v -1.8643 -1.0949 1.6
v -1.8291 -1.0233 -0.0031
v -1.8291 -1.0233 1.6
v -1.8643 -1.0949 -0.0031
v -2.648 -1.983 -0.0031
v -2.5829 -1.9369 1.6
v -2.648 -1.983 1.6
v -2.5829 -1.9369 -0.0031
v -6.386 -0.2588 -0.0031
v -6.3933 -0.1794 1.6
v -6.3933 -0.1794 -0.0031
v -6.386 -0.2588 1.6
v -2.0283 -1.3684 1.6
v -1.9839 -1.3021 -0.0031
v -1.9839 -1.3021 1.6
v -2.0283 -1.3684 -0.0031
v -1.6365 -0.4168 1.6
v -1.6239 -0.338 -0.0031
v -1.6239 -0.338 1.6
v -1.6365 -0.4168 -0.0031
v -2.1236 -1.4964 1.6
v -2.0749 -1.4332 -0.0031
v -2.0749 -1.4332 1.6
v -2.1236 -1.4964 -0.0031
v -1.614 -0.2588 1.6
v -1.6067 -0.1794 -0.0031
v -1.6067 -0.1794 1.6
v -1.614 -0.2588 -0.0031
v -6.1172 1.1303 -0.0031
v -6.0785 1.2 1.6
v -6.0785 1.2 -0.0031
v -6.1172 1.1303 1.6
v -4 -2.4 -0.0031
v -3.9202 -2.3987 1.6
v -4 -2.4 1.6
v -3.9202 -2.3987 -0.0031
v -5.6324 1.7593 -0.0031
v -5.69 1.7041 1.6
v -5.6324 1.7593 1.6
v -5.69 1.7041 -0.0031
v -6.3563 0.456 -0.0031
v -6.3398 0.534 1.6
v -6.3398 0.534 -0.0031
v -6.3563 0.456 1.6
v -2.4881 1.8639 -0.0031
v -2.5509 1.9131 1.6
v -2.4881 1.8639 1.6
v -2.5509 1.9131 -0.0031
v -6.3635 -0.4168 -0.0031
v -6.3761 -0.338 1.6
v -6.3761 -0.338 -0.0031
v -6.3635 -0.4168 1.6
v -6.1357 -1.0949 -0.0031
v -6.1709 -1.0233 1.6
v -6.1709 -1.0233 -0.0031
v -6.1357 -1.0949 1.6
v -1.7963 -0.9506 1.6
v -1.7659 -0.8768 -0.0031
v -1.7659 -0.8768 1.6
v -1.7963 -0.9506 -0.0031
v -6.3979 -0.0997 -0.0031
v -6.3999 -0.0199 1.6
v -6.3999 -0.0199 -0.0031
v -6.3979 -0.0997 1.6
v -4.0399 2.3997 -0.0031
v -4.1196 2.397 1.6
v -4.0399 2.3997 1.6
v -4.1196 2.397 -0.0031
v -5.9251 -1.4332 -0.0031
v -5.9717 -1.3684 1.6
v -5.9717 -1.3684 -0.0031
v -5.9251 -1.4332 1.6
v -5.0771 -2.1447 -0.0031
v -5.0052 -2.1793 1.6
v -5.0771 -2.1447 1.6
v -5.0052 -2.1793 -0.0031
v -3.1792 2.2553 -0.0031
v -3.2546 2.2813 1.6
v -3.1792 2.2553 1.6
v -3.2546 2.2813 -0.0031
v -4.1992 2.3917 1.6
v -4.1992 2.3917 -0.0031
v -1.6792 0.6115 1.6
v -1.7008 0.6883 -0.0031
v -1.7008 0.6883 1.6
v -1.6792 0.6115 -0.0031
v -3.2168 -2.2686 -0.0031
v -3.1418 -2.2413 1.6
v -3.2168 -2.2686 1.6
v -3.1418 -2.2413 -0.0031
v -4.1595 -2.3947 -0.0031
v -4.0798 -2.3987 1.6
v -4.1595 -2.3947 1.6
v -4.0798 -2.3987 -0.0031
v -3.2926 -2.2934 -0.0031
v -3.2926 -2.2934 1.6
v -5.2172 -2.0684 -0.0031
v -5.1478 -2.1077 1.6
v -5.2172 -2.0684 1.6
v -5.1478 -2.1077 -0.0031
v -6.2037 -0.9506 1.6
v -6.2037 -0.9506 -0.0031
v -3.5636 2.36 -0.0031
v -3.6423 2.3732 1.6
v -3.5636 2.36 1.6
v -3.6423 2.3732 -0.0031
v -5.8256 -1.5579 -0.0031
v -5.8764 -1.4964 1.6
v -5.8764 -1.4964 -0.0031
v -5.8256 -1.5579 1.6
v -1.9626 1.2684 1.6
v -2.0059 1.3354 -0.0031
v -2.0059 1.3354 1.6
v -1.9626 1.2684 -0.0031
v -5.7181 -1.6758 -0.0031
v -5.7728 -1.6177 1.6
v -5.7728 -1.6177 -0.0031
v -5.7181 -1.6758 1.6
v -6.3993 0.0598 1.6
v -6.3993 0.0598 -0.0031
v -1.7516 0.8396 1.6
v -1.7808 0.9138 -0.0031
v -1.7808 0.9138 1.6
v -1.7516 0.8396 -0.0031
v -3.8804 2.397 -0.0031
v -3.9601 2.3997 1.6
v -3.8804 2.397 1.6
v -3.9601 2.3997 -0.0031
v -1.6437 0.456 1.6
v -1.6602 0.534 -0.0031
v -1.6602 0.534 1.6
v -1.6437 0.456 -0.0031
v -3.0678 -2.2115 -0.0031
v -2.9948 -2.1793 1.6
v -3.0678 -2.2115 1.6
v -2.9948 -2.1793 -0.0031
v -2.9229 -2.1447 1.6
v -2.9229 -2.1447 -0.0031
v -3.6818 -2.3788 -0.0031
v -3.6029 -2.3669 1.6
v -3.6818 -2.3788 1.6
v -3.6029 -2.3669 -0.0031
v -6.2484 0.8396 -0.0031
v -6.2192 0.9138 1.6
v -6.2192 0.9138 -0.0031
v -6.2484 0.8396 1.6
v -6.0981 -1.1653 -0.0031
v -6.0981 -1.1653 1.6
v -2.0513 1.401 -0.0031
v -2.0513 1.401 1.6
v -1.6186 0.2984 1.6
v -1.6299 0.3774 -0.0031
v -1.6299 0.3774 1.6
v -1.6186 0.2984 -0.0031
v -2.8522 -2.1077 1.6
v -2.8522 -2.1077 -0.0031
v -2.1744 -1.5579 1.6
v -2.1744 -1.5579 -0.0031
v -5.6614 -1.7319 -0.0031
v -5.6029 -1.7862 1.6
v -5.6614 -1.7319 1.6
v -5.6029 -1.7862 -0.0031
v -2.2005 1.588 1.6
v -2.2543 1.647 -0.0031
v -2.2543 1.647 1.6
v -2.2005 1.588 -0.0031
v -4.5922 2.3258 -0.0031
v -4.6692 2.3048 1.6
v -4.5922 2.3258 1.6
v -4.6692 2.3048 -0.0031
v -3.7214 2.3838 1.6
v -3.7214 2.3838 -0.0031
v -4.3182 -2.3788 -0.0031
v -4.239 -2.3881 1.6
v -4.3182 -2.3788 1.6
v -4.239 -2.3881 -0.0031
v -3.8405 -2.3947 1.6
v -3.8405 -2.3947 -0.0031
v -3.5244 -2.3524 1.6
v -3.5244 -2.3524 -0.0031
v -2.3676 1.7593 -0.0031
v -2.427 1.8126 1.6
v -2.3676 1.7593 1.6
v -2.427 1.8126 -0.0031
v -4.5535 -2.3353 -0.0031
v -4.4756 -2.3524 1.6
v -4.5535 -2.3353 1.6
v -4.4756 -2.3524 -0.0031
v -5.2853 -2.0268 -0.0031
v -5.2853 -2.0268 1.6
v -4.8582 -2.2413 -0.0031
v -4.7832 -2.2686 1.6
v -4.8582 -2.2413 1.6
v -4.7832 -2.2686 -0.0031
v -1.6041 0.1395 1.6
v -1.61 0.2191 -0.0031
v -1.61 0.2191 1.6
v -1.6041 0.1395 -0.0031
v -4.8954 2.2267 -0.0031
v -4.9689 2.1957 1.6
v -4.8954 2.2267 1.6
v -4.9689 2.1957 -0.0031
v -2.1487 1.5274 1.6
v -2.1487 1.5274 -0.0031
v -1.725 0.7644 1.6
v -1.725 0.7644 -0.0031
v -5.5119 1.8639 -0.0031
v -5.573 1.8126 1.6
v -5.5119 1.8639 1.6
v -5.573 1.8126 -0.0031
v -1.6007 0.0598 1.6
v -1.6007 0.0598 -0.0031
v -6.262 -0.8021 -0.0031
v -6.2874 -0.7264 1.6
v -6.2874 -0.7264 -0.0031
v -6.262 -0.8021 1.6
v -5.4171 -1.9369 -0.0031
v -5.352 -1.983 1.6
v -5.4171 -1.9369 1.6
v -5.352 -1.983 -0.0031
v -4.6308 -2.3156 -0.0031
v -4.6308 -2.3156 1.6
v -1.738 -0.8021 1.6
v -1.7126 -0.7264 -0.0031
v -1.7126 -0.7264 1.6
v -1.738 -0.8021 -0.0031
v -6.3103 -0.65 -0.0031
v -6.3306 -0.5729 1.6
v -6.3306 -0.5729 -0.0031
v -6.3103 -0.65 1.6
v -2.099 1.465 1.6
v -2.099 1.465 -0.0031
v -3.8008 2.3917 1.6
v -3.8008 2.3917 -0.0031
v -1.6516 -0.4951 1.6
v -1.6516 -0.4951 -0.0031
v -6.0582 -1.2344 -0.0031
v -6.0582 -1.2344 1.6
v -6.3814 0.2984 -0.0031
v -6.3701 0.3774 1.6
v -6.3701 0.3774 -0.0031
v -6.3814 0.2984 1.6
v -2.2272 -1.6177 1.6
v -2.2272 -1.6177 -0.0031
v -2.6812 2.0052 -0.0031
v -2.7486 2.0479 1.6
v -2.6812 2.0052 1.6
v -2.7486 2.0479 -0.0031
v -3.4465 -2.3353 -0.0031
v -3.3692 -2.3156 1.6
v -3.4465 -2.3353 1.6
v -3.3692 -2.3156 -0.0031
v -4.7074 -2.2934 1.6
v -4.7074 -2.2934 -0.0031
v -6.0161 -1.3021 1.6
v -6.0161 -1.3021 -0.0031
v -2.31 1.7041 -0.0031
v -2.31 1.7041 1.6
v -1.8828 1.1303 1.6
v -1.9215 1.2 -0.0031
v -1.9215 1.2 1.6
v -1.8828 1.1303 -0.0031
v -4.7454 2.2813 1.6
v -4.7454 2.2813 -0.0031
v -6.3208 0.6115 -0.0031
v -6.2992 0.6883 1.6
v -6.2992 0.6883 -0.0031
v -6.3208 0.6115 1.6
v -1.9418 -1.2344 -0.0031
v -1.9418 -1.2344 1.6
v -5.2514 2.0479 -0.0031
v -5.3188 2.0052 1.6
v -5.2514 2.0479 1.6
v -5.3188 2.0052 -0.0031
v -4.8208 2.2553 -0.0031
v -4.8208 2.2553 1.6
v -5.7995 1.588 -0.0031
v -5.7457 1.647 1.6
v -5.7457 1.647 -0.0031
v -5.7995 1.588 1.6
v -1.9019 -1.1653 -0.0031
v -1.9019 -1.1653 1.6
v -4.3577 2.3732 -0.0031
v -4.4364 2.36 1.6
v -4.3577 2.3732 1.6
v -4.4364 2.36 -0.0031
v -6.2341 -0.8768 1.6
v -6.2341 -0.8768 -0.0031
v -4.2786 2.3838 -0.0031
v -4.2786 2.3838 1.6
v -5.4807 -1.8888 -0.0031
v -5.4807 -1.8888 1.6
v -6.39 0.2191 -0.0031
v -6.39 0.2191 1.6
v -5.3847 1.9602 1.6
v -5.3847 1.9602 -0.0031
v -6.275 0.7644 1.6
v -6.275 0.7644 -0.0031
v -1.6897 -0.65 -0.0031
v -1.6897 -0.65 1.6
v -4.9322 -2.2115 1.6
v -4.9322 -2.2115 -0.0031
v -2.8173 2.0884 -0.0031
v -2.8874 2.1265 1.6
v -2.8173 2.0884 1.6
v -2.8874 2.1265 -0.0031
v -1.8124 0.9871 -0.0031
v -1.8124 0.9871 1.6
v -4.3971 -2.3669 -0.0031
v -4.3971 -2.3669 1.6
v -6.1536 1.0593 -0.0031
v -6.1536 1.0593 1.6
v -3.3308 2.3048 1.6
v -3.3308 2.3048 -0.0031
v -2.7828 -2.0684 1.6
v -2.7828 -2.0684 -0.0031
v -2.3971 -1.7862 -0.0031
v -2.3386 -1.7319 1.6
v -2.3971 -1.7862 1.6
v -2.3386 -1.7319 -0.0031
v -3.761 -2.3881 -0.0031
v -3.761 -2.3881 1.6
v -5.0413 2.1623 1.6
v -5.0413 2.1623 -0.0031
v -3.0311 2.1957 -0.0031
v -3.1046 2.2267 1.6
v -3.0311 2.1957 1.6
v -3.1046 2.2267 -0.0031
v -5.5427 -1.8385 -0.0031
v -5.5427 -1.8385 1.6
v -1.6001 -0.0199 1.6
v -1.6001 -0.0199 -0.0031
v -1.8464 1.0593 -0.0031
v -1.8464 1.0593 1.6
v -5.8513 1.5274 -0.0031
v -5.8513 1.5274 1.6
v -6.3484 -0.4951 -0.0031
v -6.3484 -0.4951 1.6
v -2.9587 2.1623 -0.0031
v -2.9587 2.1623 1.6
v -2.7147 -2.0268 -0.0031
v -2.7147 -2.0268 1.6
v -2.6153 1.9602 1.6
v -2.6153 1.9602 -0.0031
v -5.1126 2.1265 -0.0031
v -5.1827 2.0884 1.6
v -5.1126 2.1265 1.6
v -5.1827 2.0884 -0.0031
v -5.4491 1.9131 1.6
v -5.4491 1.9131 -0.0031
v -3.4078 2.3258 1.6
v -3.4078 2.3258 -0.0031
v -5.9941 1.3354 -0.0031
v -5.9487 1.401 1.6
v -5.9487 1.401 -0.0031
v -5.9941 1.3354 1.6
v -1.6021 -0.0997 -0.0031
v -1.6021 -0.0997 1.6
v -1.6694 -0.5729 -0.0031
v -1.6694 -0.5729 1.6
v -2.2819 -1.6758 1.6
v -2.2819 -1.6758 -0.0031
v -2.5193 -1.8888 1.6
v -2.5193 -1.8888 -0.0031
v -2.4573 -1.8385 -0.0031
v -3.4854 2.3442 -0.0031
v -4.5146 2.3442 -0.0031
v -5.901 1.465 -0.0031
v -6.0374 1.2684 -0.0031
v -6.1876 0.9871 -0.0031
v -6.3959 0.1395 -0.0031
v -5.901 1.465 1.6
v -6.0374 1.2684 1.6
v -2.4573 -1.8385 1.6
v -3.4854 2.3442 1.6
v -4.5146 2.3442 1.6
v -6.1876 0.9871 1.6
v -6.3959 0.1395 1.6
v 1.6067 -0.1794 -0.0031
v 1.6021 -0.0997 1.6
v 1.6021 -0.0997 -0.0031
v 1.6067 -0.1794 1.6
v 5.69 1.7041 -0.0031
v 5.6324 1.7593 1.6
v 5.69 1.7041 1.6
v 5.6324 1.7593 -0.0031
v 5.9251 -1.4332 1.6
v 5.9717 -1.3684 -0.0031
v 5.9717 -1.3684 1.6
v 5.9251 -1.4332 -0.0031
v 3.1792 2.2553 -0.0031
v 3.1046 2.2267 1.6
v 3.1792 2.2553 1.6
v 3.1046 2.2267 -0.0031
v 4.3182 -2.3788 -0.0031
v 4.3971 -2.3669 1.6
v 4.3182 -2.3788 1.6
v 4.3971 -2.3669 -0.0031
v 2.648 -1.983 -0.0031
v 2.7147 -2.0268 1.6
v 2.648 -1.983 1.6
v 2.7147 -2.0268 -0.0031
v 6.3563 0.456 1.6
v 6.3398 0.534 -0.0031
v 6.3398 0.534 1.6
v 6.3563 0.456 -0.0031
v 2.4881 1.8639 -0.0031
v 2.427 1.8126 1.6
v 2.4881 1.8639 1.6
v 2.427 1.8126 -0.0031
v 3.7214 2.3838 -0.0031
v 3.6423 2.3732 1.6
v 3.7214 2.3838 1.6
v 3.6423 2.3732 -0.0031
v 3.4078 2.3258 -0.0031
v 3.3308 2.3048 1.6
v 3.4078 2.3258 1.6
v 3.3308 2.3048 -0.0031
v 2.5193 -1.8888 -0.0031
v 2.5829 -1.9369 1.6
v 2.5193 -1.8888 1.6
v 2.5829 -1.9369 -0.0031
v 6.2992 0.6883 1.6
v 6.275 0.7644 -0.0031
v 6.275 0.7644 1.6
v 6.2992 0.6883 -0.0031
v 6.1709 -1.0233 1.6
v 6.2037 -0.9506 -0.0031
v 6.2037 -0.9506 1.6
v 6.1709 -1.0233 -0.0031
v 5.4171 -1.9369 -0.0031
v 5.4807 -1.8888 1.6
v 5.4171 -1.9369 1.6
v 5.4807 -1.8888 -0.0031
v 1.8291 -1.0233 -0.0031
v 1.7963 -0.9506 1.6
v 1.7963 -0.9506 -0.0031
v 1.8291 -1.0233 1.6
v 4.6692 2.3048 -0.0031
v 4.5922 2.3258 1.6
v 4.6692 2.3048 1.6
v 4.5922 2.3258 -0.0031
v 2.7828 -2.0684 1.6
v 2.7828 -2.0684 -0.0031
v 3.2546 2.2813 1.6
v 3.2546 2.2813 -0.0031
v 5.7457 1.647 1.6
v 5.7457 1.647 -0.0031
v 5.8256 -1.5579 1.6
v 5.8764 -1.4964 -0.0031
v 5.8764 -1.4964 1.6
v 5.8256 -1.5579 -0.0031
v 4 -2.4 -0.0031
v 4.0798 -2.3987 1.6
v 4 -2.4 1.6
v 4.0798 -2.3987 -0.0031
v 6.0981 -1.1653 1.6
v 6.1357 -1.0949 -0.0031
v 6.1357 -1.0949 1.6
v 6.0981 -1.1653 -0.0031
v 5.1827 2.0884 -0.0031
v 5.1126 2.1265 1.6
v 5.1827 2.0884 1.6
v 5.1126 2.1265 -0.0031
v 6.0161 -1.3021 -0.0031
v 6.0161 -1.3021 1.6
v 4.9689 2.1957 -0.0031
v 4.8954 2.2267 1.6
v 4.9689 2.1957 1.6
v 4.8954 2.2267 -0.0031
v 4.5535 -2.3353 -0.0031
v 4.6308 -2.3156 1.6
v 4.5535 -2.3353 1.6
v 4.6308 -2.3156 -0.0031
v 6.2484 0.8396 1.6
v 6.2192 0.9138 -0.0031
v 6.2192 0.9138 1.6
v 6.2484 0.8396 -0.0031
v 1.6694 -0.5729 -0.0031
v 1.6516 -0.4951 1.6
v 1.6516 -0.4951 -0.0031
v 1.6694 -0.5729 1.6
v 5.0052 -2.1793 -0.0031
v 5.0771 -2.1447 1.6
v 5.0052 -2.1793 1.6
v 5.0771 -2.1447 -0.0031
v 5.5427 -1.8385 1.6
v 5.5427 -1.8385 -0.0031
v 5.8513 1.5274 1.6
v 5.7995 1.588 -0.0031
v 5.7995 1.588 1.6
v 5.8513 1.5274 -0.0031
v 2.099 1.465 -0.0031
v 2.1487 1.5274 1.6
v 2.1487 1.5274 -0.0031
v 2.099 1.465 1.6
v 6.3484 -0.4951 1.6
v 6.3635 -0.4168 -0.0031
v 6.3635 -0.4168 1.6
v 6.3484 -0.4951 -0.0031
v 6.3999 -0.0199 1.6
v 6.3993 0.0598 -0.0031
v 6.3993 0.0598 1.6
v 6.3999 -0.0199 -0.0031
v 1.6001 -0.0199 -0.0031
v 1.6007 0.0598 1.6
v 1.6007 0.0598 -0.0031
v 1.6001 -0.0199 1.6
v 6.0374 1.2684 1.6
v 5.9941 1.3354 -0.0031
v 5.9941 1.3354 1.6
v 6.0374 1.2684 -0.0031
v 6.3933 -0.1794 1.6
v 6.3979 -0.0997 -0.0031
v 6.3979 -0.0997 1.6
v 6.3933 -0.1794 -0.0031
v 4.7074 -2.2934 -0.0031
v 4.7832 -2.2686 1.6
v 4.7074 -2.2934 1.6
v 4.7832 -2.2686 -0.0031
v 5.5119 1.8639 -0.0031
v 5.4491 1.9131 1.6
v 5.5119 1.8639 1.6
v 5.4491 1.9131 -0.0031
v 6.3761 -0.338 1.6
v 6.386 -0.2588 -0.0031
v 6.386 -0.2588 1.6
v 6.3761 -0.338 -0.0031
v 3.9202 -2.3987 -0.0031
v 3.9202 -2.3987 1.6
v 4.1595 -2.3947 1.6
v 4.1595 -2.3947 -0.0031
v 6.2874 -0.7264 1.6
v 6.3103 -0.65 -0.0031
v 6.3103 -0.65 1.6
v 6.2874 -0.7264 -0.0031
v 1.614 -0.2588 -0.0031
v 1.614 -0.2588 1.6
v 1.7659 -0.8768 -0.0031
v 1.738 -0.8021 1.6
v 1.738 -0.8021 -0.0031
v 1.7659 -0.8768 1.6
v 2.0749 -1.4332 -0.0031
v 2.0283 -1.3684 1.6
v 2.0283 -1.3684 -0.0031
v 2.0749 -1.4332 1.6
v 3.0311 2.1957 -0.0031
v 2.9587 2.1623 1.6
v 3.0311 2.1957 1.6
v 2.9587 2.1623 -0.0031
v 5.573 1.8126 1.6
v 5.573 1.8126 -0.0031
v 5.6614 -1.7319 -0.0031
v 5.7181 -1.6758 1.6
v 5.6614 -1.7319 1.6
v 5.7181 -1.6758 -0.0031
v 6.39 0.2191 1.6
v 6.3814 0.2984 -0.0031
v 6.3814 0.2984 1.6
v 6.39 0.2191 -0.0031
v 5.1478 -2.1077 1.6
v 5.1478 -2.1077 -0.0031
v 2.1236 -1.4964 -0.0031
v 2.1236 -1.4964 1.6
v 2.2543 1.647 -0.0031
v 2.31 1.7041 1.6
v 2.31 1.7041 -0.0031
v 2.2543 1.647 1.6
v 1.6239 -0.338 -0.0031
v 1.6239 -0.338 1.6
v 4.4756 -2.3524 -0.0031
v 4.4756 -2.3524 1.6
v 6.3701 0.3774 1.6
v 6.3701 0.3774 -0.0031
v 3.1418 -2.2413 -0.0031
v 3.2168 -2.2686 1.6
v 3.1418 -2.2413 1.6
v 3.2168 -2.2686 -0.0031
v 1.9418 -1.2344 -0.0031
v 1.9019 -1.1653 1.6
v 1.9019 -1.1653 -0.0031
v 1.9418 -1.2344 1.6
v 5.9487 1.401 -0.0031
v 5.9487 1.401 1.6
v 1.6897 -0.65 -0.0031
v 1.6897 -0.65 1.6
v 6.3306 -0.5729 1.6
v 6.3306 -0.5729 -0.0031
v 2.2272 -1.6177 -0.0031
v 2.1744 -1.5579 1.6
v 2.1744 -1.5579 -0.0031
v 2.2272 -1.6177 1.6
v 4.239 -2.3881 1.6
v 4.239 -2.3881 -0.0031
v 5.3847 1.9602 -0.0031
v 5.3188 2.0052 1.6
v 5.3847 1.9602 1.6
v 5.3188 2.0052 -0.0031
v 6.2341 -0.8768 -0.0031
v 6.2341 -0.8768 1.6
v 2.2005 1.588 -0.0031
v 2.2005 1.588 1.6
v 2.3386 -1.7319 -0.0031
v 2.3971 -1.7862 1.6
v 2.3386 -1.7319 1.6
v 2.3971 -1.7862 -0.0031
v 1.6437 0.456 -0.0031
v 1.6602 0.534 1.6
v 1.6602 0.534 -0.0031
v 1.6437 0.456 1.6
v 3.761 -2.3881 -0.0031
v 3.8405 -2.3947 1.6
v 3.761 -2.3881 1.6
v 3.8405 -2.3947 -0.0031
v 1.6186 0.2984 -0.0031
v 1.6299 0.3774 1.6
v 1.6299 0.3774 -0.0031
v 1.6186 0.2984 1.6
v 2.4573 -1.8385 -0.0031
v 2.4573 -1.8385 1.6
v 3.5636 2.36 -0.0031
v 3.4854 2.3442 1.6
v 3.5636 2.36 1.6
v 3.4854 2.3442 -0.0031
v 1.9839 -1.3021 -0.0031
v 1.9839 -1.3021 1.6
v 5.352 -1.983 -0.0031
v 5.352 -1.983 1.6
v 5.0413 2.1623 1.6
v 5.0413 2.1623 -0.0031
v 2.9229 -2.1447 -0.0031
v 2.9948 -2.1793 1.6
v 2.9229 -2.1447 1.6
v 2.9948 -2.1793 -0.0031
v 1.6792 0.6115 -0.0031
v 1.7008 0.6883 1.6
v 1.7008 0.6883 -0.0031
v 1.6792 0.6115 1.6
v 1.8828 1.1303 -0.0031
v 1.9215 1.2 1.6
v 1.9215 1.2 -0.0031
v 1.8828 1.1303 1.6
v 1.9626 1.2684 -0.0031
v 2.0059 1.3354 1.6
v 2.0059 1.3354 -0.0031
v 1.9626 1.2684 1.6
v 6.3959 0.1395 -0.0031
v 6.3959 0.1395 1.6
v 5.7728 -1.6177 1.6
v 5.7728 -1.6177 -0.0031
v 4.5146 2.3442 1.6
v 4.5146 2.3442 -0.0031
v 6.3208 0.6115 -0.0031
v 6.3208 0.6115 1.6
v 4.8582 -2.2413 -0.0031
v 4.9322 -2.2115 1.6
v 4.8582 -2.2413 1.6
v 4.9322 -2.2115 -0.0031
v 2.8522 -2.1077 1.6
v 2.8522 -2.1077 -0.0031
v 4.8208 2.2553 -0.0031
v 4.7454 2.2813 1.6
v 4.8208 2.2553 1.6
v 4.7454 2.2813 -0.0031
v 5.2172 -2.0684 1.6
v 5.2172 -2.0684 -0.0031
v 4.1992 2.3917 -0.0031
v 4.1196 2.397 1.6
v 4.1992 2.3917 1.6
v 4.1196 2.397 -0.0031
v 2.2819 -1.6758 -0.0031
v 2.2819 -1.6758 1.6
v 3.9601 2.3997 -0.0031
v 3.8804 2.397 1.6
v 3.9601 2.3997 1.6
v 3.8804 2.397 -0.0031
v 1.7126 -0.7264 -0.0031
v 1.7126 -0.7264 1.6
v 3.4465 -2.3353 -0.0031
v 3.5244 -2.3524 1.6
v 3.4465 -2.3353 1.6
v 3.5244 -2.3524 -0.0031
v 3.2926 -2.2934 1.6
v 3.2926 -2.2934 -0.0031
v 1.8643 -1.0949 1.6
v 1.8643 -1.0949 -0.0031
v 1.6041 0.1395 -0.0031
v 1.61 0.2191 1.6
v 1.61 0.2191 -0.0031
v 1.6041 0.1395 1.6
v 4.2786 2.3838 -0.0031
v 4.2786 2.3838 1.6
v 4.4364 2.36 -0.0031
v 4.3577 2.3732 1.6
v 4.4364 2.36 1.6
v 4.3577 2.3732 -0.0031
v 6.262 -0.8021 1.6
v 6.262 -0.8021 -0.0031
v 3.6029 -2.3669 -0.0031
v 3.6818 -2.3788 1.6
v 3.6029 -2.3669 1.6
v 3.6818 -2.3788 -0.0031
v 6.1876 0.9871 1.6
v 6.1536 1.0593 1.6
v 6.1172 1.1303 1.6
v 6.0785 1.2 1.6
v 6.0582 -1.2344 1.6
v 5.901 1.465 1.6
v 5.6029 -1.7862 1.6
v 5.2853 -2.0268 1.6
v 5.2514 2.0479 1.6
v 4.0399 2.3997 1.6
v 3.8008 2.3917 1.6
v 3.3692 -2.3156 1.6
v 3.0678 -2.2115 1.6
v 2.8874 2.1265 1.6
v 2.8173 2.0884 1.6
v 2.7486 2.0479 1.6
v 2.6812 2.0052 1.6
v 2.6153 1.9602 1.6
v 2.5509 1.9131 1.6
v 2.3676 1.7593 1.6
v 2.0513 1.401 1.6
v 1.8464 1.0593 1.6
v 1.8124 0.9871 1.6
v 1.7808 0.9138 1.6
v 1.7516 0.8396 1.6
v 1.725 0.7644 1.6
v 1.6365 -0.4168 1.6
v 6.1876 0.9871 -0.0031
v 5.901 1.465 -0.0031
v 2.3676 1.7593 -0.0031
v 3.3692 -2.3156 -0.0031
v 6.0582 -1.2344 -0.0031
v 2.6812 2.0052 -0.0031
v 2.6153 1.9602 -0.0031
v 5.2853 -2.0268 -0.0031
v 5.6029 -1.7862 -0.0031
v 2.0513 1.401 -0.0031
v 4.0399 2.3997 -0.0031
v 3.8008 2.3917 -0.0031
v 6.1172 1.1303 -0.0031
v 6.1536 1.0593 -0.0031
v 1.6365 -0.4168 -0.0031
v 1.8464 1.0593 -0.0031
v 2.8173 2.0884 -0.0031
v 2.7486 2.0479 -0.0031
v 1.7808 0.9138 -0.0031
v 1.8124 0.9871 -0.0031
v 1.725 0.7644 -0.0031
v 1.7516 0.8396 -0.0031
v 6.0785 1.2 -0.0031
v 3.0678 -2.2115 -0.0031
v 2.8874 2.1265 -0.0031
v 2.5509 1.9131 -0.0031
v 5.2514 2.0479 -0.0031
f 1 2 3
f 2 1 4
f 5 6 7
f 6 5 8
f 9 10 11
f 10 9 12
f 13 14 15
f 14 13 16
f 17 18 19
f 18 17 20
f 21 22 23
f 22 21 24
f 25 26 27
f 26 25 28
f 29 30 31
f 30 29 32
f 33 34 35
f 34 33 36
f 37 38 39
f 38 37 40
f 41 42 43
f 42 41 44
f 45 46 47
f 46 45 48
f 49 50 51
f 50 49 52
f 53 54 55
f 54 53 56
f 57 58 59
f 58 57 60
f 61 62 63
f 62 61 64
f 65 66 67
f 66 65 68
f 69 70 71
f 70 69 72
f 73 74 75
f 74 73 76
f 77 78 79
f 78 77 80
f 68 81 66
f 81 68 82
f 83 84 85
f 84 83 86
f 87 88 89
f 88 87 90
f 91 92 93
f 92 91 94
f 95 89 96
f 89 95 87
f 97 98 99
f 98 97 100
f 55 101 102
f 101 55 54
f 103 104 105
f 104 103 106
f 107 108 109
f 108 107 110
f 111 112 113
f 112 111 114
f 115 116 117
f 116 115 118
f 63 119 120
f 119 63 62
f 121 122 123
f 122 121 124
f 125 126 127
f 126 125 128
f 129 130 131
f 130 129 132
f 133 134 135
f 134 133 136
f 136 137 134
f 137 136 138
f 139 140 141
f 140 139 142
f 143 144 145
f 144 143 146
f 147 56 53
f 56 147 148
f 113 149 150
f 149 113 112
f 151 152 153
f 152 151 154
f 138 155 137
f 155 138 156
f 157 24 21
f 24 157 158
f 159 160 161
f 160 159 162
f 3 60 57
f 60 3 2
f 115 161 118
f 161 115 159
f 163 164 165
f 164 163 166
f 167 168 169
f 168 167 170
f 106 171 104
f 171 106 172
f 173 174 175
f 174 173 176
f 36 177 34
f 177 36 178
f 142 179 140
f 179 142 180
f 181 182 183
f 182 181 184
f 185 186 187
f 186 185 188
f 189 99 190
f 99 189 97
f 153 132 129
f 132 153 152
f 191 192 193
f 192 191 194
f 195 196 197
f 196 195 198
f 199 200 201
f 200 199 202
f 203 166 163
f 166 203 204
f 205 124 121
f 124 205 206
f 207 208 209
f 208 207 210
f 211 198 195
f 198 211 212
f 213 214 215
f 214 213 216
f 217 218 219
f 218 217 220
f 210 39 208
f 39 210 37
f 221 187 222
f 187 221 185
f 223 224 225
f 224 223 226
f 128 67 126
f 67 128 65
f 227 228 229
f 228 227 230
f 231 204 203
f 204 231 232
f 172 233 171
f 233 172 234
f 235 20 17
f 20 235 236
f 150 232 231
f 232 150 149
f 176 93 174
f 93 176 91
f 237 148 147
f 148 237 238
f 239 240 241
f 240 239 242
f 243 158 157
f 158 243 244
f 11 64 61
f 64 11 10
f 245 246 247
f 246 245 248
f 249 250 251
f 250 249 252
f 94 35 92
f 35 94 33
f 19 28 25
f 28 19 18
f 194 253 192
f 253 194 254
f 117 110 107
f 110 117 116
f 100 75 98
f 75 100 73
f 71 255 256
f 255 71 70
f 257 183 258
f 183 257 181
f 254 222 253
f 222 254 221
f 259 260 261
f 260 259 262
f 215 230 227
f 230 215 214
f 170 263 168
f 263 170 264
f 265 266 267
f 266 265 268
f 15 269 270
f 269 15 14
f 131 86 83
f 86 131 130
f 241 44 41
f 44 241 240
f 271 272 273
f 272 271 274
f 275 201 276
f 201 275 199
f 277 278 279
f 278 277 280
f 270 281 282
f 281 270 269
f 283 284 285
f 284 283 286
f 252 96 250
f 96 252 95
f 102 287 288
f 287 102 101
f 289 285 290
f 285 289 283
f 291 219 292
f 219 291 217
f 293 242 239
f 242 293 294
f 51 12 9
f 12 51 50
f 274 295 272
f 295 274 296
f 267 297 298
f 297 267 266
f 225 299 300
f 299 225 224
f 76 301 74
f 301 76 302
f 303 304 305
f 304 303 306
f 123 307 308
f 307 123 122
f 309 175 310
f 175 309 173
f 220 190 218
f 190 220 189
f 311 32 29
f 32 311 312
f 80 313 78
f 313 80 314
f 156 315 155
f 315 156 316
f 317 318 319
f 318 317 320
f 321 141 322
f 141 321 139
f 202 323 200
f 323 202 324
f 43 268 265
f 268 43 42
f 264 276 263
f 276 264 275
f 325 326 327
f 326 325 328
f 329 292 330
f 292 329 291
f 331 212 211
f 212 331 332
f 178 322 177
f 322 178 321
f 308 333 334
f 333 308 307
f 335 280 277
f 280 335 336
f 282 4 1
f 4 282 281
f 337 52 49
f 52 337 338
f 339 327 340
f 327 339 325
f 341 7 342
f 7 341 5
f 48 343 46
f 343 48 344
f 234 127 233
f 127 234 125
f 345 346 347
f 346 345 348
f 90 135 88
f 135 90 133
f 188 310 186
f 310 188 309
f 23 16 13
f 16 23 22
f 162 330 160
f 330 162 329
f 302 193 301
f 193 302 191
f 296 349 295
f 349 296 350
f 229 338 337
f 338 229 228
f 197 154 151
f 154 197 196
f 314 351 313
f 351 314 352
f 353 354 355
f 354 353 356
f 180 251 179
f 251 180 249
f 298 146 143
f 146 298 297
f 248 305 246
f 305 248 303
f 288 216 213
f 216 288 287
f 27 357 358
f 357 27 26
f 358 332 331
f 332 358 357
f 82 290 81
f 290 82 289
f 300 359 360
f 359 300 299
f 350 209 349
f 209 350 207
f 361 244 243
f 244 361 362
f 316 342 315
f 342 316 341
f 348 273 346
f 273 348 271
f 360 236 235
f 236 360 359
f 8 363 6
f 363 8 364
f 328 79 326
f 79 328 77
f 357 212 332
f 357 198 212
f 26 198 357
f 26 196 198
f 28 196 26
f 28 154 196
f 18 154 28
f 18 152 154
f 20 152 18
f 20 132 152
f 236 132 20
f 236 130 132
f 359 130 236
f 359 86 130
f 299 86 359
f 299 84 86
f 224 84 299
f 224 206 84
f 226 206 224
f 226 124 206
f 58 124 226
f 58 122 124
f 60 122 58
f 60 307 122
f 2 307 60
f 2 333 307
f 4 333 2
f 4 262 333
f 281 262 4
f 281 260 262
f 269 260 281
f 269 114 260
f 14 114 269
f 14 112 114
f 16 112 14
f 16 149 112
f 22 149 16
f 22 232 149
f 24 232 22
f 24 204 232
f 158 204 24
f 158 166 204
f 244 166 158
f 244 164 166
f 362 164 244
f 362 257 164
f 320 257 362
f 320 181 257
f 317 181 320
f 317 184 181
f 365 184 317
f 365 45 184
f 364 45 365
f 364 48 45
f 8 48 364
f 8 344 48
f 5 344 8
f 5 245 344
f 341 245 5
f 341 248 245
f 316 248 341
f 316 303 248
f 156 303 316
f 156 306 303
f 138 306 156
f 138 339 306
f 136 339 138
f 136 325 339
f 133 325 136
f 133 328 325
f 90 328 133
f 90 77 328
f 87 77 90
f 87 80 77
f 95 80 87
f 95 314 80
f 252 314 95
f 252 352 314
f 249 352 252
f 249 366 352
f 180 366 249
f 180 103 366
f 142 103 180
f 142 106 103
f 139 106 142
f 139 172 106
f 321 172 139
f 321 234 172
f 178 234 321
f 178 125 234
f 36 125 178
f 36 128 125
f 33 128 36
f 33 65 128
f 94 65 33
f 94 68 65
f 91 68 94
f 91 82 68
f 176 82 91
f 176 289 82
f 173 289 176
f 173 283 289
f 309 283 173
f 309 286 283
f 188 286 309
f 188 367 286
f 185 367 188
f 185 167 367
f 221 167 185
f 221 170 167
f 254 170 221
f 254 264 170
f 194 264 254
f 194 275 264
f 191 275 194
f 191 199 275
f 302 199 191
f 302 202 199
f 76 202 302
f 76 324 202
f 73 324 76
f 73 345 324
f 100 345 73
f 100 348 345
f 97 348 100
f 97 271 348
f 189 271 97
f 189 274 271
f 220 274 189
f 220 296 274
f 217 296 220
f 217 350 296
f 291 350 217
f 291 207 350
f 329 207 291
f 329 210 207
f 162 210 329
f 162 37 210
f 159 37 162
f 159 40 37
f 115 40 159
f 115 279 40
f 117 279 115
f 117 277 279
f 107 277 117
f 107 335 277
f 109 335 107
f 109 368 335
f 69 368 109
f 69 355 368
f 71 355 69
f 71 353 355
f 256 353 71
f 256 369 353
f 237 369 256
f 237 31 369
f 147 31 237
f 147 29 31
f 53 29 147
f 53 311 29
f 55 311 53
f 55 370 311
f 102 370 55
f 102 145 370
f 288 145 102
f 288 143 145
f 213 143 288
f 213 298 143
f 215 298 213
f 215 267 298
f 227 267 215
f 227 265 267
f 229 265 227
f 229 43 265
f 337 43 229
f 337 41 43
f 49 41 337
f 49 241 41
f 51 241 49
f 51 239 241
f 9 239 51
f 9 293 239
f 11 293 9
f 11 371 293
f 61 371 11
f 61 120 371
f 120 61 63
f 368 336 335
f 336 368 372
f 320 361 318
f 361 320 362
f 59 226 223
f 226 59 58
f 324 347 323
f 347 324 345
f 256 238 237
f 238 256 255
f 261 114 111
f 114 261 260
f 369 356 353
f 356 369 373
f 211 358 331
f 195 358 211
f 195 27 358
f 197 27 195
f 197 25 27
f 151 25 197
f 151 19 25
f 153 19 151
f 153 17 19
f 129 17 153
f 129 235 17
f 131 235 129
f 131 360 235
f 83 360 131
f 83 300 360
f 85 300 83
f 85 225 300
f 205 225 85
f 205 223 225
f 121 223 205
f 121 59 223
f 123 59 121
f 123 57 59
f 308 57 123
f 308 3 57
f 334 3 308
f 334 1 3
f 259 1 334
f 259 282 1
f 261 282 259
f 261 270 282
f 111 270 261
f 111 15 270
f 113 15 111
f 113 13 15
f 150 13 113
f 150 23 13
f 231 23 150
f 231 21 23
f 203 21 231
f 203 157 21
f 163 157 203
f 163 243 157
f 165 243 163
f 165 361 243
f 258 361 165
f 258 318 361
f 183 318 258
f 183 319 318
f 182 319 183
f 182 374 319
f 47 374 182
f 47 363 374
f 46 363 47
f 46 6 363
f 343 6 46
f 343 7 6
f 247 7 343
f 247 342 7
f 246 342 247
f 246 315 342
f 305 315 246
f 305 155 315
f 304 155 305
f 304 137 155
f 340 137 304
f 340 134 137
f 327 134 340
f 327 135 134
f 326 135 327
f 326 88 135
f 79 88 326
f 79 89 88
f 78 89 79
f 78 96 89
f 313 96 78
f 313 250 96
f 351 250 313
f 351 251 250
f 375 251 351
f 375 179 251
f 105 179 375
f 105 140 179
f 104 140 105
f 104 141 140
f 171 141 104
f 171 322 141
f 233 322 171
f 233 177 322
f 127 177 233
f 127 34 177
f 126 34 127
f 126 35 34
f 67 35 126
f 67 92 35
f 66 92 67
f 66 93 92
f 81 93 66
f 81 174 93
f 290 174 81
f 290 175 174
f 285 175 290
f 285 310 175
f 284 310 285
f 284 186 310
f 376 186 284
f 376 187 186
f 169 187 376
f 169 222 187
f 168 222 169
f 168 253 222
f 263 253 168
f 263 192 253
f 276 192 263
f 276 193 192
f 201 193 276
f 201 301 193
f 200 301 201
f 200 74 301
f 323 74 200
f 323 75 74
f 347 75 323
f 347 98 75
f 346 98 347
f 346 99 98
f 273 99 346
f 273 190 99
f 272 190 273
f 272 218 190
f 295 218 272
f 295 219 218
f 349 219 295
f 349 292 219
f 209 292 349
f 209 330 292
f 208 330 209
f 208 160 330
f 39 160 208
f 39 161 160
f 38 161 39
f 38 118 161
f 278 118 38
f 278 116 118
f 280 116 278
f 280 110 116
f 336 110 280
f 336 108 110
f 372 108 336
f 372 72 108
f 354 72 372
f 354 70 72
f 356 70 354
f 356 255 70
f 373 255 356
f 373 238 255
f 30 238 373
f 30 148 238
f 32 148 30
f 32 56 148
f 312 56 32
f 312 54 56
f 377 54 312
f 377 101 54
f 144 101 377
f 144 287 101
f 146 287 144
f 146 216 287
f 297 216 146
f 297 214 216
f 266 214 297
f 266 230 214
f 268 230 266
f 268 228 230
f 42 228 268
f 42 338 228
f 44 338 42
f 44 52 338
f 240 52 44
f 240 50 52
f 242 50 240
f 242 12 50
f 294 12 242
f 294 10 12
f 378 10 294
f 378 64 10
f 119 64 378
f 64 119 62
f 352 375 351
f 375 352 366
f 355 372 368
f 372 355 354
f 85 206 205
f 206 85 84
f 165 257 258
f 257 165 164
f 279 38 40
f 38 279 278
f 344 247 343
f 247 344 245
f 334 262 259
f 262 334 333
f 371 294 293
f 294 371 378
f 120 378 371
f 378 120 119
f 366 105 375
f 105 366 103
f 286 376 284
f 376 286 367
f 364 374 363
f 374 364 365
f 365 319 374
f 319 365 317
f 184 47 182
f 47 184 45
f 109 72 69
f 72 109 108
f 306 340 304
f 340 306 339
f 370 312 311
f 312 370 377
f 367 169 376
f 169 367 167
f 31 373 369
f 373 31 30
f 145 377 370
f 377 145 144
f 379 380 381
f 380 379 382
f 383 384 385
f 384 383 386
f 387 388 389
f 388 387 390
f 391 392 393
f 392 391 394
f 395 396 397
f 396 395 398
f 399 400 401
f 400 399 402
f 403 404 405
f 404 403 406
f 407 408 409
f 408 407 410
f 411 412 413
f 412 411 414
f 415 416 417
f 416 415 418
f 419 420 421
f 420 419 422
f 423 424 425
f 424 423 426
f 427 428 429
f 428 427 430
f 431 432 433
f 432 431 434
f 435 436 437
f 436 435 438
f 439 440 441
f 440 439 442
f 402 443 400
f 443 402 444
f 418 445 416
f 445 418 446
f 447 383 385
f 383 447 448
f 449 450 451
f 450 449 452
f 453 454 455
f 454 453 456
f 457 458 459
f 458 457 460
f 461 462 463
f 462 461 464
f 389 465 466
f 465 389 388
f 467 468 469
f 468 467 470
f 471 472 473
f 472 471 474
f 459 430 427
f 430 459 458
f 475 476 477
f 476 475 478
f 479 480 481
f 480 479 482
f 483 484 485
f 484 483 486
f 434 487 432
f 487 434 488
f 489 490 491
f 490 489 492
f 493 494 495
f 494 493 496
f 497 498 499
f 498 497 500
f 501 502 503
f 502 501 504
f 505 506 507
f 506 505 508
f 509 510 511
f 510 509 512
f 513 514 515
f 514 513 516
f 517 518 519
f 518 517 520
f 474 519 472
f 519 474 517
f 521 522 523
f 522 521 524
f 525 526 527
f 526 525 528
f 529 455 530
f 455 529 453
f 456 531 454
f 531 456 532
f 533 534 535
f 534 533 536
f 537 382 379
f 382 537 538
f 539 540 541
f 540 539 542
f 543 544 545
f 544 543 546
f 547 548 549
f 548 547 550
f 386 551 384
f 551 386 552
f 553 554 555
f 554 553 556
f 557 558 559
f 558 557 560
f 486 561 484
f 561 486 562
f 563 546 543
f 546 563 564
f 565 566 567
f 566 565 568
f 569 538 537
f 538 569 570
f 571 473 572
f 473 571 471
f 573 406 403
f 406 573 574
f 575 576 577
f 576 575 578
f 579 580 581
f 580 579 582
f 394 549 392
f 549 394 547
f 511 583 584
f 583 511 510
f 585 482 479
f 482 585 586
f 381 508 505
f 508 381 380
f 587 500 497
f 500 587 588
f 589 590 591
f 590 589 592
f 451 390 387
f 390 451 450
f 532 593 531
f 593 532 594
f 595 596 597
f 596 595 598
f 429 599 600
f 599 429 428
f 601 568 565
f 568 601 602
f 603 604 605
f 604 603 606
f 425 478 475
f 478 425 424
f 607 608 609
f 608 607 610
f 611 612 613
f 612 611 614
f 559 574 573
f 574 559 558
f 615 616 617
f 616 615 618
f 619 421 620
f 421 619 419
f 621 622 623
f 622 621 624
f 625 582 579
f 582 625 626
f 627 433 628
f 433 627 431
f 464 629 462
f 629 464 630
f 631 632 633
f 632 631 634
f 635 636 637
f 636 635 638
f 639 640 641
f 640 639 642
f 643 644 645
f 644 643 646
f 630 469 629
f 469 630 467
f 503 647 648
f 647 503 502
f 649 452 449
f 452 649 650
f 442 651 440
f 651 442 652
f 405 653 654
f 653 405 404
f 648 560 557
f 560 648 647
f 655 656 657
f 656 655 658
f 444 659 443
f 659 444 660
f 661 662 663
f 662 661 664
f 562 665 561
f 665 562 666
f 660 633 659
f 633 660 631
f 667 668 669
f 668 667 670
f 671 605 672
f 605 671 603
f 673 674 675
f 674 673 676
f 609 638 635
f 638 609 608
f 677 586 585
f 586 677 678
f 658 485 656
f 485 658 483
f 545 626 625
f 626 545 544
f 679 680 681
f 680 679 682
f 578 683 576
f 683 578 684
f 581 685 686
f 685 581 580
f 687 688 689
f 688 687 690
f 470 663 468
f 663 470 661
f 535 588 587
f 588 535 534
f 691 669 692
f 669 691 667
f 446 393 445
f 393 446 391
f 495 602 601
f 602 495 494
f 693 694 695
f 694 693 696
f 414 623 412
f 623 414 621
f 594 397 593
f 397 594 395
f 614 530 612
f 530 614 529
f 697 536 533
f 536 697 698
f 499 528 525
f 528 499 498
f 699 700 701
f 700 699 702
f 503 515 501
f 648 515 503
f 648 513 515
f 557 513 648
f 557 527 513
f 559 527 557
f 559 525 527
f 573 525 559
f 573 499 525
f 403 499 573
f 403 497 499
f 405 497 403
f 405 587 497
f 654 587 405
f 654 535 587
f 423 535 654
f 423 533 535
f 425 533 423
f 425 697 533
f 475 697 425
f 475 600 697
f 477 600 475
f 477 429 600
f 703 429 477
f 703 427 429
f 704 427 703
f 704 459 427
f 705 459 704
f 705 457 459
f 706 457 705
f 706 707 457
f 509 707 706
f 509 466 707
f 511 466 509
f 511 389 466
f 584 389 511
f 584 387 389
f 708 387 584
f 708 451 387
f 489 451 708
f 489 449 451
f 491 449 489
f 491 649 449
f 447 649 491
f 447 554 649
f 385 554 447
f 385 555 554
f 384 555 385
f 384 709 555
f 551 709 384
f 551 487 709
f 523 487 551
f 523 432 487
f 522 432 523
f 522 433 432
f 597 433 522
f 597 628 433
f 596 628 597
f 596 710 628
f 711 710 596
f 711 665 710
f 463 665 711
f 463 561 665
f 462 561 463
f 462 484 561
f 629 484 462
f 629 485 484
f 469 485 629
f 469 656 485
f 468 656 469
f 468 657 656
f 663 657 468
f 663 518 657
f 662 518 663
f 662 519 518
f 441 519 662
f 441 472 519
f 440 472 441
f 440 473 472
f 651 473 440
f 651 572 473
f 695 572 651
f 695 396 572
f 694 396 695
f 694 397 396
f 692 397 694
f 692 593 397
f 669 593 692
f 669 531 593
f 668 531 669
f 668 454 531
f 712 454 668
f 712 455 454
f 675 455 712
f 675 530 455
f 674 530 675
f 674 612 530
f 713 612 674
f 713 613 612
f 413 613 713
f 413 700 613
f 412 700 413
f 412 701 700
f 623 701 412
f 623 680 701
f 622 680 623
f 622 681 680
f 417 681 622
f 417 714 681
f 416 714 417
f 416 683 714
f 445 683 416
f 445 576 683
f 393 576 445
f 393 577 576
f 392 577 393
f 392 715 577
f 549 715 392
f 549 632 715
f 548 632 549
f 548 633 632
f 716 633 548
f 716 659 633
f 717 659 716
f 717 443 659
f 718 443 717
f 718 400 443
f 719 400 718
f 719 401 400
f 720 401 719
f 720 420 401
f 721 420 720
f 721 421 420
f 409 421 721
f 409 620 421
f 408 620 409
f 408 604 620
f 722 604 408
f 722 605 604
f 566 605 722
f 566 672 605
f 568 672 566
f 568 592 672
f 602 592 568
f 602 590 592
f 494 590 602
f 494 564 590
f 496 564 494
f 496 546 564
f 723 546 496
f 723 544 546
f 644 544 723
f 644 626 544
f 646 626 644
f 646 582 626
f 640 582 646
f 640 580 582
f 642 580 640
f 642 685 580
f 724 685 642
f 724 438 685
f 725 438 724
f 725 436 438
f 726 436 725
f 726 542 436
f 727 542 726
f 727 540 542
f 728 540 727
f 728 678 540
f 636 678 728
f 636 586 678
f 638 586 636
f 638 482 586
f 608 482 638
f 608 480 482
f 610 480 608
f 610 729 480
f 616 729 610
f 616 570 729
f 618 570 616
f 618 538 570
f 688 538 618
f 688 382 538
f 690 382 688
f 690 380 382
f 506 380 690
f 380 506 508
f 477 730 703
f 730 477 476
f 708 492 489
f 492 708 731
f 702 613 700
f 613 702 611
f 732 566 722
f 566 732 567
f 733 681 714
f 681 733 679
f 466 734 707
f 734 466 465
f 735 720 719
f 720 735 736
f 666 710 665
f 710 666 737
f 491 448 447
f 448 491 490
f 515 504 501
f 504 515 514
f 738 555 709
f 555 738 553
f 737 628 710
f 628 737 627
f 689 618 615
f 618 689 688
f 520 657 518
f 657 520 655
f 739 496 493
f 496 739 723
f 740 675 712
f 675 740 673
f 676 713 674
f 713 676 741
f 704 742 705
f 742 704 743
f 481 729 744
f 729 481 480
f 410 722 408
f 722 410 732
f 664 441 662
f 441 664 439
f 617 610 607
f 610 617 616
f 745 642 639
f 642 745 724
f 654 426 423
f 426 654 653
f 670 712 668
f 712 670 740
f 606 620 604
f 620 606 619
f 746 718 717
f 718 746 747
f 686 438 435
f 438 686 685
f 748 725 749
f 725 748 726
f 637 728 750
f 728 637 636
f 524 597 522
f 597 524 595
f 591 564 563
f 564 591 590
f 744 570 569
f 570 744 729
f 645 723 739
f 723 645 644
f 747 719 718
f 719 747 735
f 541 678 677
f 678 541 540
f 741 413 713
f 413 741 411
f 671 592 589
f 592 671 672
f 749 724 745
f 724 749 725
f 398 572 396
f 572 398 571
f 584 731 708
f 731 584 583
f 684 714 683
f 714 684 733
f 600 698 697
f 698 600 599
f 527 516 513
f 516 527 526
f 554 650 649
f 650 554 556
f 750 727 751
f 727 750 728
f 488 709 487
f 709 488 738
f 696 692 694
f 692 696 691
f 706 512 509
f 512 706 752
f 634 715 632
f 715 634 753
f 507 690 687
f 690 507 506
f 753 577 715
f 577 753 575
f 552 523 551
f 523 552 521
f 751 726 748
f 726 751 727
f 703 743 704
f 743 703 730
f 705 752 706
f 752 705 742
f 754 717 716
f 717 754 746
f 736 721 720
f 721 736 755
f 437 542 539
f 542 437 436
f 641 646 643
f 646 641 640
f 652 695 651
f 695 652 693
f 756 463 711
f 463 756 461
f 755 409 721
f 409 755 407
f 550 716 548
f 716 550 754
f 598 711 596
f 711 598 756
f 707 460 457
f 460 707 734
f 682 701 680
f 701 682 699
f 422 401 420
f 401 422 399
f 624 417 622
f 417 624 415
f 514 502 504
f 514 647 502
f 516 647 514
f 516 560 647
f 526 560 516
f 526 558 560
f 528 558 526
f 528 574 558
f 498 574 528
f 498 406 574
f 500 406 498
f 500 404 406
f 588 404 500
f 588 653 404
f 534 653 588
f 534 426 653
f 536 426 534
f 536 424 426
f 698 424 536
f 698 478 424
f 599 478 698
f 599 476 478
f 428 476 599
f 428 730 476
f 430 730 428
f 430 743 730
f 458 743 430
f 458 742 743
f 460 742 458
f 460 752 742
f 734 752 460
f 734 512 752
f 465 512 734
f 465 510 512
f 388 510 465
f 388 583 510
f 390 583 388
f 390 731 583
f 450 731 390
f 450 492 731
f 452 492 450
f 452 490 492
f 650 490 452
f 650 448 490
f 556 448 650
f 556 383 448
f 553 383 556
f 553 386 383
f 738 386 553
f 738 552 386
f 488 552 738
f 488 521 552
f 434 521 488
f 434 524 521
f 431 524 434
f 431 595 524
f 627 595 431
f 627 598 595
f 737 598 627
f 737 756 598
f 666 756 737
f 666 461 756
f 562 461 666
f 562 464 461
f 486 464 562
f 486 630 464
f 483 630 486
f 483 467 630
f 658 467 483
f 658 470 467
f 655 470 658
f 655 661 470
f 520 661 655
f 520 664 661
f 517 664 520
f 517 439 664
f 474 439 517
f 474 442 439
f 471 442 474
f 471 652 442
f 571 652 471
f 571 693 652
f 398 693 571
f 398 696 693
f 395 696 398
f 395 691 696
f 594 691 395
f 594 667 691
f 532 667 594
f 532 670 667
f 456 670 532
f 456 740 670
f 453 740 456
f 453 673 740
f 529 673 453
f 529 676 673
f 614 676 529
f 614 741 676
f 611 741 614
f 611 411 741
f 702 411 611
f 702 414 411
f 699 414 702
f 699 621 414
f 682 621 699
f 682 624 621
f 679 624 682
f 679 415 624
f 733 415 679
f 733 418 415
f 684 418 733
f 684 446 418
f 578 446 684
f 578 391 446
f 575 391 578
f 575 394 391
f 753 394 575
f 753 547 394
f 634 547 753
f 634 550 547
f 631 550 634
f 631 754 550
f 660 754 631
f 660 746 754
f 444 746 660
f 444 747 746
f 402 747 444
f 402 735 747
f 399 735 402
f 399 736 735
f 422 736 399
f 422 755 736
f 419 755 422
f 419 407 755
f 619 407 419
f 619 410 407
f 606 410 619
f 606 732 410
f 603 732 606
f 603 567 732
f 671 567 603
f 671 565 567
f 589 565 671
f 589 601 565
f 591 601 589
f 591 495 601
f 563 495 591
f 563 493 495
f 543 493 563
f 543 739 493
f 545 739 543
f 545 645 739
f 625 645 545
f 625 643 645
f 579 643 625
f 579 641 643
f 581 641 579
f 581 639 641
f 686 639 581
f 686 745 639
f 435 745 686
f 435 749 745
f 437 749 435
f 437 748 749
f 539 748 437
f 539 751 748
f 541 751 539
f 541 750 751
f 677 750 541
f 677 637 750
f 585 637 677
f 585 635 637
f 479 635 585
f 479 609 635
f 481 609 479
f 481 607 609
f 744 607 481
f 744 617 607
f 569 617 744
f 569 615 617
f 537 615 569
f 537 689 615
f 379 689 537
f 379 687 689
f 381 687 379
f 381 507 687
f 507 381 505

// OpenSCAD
use <../lib.scad>
use <s/3039s01.scad>
$fa=1; $fs=0.2;
function ldraw_lib__3039pt1(realsolid=false) = [
// 0 Slope Brick 45  2 x  2 with White "1" Pattern
// 0 Name: 3039pt1.dat
// 0 Author: Michael Heidemann [mikeheide]
// 0 !LDRAW_ORG Part UPDATE 2005-01
// 0 !LICENSE Licensed under CC BY 2.0 and CC BY 4.0 : see CAreadme.txt
// 
// 0 BFC CERTIFY CCW
  [0,"BFC","CERTIFY"],
  [0,"BFC","CCW"],
// 
// 0 !HISTORY 2005-12-28 [PTadmin] Official Update 2005-01
// 0 !HISTORY 2007-06-09 [PTadmin] Header formatted for Contributor Agreement
// 0 !HISTORY 2008-07-01 [PTadmin] Official Update 2008-01
// 
// 
// 1 16 0 0 0 1 0 0 0 1 0 0 0 1 s\3039s01.dat
  [1,16,0,0,0,1,0,0,0,1,0,0,0,1, ldraw_lib__s__3039s01(realsolid)],
// 4 15 -2 18.7383 -28.7383 3 18.7383 -28.7383 3 .8839 -10.8839 -2 6.5407 -16.5407
  [4,15,-2,18.7383,-28.7383,3,18.7383,-28.7383,3,.8839,-10.8839,-2,6.5407,-16.5407],
// 3 15 -7.75 3.8891 -13.8891 -7.75 6.5407 -16.5407 -2 6.5407 -16.5407
  [3,15,-7.75,3.8891,-13.8891,-7.75,6.5407,-16.5407,-2,6.5407,-16.5407],
// 3 15 -7.75 3.8891 -13.8891 -2 6.5407 -16.5407 -5 3.8891 -13.8891
  [3,15,-7.75,3.8891,-13.8891,-2,6.5407,-16.5407,-5,3.8891,-13.8891],
// 3 15 -5 3.8891 -13.8891 -2 6.5407 -16.5407 -3 3.3588 -13.3588
  [3,15,-5,3.8891,-13.8891,-2,6.5407,-16.5407,-3,3.3588,-13.3588],
// 3 15 -3 3.3588 -13.3588 -2 6.5407 -16.5407 -1.75 2.2981 -12.2981
  [3,15,-3,3.3588,-13.3588,-2,6.5407,-16.5407,-1.75,2.2981,-12.2981],
// 3 15 3 .8839 -10.8839 -1.25 .8839 -10.8839 -1.75 2.2981 -12.2981
  [3,15,3,.8839,-10.8839,-1.25,.8839,-10.8839,-1.75,2.2981,-12.2981],
// 3 15 -1.75 2.2981 -12.2981 -2 6.5407 -16.5407 3 .8839 -10.8839
  [3,15,-1.75,2.2981,-12.2981,-2,6.5407,-16.5407,3,.8839,-10.8839],
// 4 16 20 0 -10 3 .8839 -10.8839 3 18.7383 -28.7383 20 20 -30
  [4,16,20,0,-10,3,.8839,-10.8839,3,18.7383,-28.7383,20,20,-30],
// 4 16 -20 20 -30 20 20 -30 3 18.7383 -28.7383 -2 18.7383 -28.7383
  [4,16,-20,20,-30,20,20,-30,3,18.7383,-28.7383,-2,18.7383,-28.7383],
// 4 16 -7.75 6.5407 -16.5407 -7.75 3.8891 -13.8891 -20 0 -10 -20 20 -30
  [4,16,-7.75,6.5407,-16.5407,-7.75,3.8891,-13.8891,-20,0,-10,-20,20,-30],
// 4 16 -20 0 -10 -1.25 .8839 -10.8839 3 .8839 -10.8839 20 0 -10
  [4,16,-20,0,-10,-1.25,.8839,-10.8839,3,.8839,-10.8839,20,0,-10],
// 4 16 -2 6.5407 -16.5407 -7.75 6.5407 -16.5407 -20 20 -30 -2 18.7383 -28.7383
  [4,16,-2,6.5407,-16.5407,-7.75,6.5407,-16.5407,-20,20,-30,-2,18.7383,-28.7383],
// 3 16 -1.75 2.2981 -12.2981 -1.25 .8839 -10.8839 -20 0 -10
  [3,16,-1.75,2.2981,-12.2981,-1.25,.8839,-10.8839,-20,0,-10],
// 3 16 -20 0 -10 -3 3.3588 -13.3588 -1.75 2.2981 -12.2981
  [3,16,-20,0,-10,-3,3.3588,-13.3588,-1.75,2.2981,-12.2981],
// 3 16 -5 3.8891 -13.8891 -3 3.3588 -13.3588 -20 0 -10
  [3,16,-5,3.8891,-13.8891,-3,3.3588,-13.3588,-20,0,-10],
// 3 16 -20 0 -10 -7.75 3.8891 -13.8891 -5 3.8891 -13.8891
  [3,16,-20,0,-10,-7.75,3.8891,-13.8891,-5,3.8891,-13.8891],
// 0
// 0 Pattern created wholly or in part by Quad2Dat
// 0 Thanks James
// 0
];
module ldraw_lib__3039pt1(step=0, col=false, unit=2/5, alt=false, line=0.2, solid=!$preview)
    makepoly(ldraw_lib__3039pt1(solid), step=step, col=col, unit=unit, alt=alt, line=line, solid=solid);
ldraw_lib__3039pt1(line=0.2);
